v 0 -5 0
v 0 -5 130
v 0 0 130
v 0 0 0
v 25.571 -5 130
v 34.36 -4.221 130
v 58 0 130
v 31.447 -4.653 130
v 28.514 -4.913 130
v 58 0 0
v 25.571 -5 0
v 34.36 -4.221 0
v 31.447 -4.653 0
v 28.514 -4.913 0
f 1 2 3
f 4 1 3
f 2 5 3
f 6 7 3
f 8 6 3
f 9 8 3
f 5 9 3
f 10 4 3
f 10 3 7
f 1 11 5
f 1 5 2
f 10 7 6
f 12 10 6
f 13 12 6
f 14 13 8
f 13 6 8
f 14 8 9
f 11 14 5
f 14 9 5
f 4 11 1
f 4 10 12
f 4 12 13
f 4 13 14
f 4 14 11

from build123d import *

# Parameters (mm, degrees)
BOSS_EXTRUDE1_DEPTH = 130
FILLET1_R           = 50


with BuildPart() as part:
    # Sketch1 → Boss-Extrude1 (new body)
    with BuildSketch(Plane.XY):
        Polygon((0, 0), (58, 0), (30, -5), (0, -5), align=None)
    extrude(amount=BOSS_EXTRUDE1_DEPTH)

    # Fillet1
    fillet1_edges = [part.edges().sort_by_distance(p)[0] for p in [
        (30, -5, 65),
    ]]
    fillet(fillet1_edges, radius=FILLET1_R)


solid = part.part
